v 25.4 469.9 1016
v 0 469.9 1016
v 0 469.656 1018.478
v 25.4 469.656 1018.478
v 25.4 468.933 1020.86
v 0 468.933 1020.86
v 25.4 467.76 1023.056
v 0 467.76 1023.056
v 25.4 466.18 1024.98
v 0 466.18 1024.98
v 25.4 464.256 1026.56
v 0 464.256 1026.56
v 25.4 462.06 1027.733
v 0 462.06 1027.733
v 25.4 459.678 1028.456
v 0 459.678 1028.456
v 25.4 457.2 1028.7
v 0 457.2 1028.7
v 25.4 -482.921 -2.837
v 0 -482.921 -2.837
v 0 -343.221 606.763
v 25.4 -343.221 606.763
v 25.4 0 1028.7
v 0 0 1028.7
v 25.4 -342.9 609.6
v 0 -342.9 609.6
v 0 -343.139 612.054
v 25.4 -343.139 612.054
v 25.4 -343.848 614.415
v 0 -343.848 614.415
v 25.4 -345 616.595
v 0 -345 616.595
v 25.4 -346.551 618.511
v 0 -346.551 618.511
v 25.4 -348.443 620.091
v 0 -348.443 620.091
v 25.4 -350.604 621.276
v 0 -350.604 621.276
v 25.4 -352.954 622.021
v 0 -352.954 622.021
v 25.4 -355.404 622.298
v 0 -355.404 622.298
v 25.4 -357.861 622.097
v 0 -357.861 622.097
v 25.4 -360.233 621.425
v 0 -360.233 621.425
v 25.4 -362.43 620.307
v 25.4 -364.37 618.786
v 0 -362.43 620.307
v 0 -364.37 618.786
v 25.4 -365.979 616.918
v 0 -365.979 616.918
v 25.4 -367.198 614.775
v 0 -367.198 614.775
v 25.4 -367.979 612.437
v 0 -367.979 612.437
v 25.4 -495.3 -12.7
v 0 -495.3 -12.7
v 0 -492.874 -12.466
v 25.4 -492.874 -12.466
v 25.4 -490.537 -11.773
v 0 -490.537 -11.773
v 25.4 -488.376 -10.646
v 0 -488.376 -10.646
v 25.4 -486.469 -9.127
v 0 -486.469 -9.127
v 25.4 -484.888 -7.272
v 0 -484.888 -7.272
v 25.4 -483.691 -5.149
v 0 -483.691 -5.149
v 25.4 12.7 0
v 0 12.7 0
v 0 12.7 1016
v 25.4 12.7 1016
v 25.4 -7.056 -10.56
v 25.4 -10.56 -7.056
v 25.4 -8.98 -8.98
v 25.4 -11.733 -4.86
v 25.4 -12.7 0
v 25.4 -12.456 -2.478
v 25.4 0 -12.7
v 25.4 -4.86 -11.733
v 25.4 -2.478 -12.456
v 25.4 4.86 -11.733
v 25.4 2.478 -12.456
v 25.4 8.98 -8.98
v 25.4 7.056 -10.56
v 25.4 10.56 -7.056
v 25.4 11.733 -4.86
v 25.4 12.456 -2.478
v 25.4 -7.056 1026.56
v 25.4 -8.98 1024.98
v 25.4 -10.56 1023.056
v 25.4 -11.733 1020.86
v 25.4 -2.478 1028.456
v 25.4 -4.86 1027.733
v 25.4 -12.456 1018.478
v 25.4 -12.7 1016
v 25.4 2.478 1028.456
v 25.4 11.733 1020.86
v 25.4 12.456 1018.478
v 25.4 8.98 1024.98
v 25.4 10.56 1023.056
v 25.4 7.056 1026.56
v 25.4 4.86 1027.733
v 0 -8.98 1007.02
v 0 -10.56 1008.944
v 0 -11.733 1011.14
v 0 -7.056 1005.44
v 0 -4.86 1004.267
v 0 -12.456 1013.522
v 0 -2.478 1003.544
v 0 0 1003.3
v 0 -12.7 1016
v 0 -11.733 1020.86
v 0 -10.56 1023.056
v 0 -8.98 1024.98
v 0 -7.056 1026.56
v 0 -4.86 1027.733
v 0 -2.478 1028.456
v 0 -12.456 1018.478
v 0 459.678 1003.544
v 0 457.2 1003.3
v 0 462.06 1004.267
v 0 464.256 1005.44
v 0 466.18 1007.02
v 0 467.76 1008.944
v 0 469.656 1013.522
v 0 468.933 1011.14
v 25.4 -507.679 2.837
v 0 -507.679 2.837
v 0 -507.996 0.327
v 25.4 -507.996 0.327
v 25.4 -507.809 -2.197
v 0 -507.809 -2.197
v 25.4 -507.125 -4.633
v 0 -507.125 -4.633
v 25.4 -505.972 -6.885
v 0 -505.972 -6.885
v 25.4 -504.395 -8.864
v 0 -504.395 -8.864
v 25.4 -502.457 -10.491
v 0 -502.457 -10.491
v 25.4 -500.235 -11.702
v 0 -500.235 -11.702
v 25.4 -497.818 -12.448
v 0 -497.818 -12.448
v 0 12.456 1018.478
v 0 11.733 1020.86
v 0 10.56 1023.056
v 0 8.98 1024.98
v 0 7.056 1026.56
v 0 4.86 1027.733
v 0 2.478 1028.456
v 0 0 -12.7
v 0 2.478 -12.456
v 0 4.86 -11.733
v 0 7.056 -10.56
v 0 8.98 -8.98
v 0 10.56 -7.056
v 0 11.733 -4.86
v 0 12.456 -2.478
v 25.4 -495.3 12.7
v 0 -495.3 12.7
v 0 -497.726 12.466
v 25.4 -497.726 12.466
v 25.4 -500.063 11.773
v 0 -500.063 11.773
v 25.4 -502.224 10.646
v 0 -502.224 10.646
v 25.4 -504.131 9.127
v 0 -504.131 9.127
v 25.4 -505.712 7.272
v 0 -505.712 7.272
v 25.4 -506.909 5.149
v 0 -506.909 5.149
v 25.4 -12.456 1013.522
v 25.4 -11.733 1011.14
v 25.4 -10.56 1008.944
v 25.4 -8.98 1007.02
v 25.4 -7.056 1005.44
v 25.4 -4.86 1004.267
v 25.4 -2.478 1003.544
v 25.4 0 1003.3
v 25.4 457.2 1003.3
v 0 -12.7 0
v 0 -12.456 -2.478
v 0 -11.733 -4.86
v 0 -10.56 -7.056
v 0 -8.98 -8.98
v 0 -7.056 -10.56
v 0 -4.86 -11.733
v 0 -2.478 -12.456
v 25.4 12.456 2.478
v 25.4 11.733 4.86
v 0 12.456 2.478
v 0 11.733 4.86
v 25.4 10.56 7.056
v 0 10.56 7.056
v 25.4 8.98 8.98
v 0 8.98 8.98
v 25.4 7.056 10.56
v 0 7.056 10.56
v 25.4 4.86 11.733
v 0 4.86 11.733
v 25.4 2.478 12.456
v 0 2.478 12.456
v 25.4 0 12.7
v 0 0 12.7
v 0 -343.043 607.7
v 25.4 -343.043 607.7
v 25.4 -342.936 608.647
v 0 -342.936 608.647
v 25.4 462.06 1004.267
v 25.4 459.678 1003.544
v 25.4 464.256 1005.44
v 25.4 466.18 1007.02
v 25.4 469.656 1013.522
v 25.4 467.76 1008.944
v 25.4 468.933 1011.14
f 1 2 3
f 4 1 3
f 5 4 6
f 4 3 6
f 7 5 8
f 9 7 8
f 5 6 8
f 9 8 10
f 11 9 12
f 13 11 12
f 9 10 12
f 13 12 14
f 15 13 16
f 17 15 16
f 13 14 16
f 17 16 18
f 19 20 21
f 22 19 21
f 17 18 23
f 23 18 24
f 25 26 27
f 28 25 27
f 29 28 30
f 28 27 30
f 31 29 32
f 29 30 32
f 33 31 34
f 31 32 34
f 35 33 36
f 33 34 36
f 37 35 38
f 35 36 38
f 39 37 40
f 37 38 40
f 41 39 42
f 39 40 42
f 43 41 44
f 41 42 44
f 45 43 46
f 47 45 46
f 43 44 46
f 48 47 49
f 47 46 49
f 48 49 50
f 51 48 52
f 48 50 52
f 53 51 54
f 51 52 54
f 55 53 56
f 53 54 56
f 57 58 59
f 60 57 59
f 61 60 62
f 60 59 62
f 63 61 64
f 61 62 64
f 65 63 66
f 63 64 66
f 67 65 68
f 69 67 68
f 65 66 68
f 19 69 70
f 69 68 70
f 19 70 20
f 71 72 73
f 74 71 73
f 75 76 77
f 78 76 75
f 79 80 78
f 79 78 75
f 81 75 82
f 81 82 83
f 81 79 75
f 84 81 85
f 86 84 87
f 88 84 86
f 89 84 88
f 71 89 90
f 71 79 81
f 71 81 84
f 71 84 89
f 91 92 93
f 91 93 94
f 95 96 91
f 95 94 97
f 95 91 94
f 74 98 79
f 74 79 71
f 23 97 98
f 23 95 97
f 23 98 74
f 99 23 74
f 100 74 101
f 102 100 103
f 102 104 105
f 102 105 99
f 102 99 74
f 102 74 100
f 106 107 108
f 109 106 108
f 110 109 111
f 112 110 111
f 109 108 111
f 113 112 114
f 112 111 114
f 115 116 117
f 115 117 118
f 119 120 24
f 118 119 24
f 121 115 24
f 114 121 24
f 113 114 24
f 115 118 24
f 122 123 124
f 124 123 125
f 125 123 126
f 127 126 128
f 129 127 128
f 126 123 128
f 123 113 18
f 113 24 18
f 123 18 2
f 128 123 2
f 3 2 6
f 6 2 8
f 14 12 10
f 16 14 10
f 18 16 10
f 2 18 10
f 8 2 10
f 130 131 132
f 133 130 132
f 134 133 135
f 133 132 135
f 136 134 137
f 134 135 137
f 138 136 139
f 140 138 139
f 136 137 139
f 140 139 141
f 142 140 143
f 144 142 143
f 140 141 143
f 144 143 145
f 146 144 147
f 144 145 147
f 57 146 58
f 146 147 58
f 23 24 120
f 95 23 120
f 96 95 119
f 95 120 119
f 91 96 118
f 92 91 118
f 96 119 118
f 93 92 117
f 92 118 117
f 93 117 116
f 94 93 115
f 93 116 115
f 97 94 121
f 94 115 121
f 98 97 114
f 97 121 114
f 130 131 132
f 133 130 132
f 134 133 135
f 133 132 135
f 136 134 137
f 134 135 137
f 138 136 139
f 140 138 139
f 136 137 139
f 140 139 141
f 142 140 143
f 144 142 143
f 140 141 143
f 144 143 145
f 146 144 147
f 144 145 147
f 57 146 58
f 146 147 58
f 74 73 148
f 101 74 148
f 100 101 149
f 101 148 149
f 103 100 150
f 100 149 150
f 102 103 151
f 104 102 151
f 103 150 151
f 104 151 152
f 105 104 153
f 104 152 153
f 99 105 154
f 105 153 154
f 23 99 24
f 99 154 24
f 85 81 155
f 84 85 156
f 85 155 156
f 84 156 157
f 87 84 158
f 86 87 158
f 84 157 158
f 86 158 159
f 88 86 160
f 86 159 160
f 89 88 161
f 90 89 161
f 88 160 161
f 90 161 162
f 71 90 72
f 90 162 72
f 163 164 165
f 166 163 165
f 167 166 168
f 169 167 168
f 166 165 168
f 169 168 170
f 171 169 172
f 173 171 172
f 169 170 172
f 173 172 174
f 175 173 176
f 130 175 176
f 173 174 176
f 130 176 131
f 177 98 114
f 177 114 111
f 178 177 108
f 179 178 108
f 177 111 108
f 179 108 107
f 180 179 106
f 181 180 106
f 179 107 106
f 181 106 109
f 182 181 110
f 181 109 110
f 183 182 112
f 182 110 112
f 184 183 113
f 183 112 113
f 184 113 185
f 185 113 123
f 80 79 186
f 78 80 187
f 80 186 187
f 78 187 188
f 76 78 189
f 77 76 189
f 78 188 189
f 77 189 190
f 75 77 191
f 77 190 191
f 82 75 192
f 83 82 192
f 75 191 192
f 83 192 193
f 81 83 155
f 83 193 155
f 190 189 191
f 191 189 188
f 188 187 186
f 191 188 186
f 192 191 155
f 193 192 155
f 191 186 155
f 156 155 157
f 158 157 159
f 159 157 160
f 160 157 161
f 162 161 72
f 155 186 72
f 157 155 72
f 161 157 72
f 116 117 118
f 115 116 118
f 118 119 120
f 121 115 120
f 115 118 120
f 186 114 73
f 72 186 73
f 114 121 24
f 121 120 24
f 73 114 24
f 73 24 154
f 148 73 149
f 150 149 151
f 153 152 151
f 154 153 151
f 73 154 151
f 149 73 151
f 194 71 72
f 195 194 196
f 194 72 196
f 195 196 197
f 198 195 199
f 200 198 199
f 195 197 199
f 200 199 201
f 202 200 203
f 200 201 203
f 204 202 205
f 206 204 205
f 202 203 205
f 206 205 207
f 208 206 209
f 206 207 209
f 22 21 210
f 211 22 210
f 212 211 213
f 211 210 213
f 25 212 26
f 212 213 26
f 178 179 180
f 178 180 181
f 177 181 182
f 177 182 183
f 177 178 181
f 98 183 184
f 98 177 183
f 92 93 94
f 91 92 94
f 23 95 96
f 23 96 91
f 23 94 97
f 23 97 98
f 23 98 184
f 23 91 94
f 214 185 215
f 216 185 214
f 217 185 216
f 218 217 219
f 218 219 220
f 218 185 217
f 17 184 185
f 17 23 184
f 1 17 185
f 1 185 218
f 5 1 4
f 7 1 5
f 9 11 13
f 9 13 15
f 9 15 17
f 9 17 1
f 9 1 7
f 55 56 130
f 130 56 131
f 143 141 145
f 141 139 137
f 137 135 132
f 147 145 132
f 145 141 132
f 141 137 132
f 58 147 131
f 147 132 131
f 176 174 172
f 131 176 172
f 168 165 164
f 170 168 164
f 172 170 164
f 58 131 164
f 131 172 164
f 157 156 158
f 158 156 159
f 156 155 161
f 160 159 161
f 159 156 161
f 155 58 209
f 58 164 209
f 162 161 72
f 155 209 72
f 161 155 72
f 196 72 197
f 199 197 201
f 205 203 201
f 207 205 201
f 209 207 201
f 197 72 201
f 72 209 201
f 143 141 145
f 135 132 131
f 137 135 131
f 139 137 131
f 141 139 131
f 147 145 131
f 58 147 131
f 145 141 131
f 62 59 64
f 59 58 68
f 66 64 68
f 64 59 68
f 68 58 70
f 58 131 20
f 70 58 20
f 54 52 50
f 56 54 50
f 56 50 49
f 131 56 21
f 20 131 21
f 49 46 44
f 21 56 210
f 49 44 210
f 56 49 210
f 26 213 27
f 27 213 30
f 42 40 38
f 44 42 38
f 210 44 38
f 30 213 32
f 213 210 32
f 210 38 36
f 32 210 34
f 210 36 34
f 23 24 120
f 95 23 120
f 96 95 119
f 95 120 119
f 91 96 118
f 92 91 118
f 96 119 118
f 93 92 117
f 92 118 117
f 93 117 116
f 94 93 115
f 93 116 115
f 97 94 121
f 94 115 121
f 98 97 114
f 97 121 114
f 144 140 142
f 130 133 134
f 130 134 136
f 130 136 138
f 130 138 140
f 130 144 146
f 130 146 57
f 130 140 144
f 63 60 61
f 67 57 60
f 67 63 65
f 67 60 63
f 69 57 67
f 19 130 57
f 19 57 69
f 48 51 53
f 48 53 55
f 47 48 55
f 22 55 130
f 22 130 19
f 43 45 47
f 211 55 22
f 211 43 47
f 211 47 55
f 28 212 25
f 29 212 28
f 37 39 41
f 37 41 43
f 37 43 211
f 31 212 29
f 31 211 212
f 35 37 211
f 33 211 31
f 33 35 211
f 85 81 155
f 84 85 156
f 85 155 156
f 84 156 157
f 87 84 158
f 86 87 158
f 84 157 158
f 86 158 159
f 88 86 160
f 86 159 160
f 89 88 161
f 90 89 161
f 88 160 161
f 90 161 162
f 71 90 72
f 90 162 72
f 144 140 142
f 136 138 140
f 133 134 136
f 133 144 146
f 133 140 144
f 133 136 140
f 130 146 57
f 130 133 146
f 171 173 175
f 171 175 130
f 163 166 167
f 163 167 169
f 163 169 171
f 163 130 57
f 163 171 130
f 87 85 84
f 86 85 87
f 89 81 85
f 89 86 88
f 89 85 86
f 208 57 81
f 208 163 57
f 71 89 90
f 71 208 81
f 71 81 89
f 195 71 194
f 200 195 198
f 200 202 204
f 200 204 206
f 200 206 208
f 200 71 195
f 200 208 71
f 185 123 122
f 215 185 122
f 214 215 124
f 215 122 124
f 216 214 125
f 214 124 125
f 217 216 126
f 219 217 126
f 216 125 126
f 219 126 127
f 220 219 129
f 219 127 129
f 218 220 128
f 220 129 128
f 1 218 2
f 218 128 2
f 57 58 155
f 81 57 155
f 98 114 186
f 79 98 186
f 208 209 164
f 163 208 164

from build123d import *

# Parameters (mm, degrees)
F1_DEPTH = 25.4
F2_DEPTH = 25.4
F3_DEPTH = 25.4
F4_DEPTH = 25.4


with BuildPart() as f1:
    # F0 (on Right) → F1 (new body)
    with BuildSketch(Plane.YZ):
        with BuildLine():
            ThreePointArc((12.7, 1016), (8.9802561211, 1024.9802561211), (0, 1028.7))
            ThreePointArc((0, 1028.7), (-8.9802561211, 1024.9802561211), (-12.7, 1016))
            ThreePointArc((-12.7, 1016), (-8.9802561211, 1007.0197438789), (0, 1003.3))
            ThreePointArc((0, 1003.3), (8.9802561211, 1007.0197438789), (12.7, 1016))
        make_face()
        with BuildLine():
            Line((0, 1003.3), (12.7, 1003.3))
            Line((12.7, 1003.3), (12.7, 1016))
            ThreePointArc((12.7, 1016), (8.9802561211, 1007.0197438789), (0, 1003.3))
        make_face()
        with BuildLine():
            ThreePointArc((0, -12.7), (8.9802561211, -8.9802561211), (12.7, 0))
            ThreePointArc((12.7, 0), (8.9802561211, 8.9802561211), (0, 12.7))
            ThreePointArc((0, 12.7), (-8.9802561211, 8.9802561211), (-12.7, 0))
            ThreePointArc((-12.7, 0), (-8.9802561211, -8.9802561211), (0, -12.7))
        make_face()
        with BuildLine():
            Line((0, 12.7), (-12.7, 12.7))
            Line((-12.7, 12.7), (-12.7, 0))
            ThreePointArc((-12.7, 0), (-8.9802561211, 8.9802561211), (0, 12.7))
        make_face()
        with BuildLine():
            Line((12.7, 0), (12.7, 1003.3))
            Line((12.7, 1003.3), (0, 1003.3))
            ThreePointArc((0, 1003.3), (-8.9802561211, 1007.0197438789), (-12.7, 1016))
            Line((-12.7, 1016), (-12.7, 12.7))
            Line((-12.7, 12.7), (0, 12.7))
            ThreePointArc((0, 12.7), (8.9802561211, 8.9802561211), (12.7, 0))
        make_face()
    extrude(amount=F1_DEPTH)


with BuildPart() as f2:
    # F0 (on Right) → F2 (new body)
    with BuildSketch(Plane.YZ):
        with BuildLine():
            ThreePointArc((457.2, 1003.3), (444.5, 1016), (457.2, 1028.7))
            Line((457.2, 1028.7), (0, 1028.7))
            ThreePointArc((0, 1028.7), (8.9802561211, 1024.9802561211), (12.7, 1016))
            Line((12.7, 1016), (12.7, 1003.3))
            Line((12.7, 1003.3), (457.2, 1003.3))
        make_face()
        with BuildLine():
            ThreePointArc((457.2, 1003.3), (466.1802561211, 1007.0197438789), (469.9, 1016))
            ThreePointArc((469.9, 1016), (466.1802561211, 1024.9802561211), (457.2, 1028.7))
            ThreePointArc((457.2, 1028.7), (444.5, 1016), (457.2, 1003.3))
        make_face()
        with BuildLine():
            ThreePointArc((12.7, 1016), (8.9802561211, 1024.9802561211), (0, 1028.7))
            ThreePointArc((0, 1028.7), (-8.9802561211, 1024.9802561211), (-12.7, 1016))
            ThreePointArc((-12.7, 1016), (-8.9802561211, 1007.0197438789), (0, 1003.3))
            ThreePointArc((0, 1003.3), (8.9802561211, 1007.0197438789), (12.7, 1016))
        make_face()
        with BuildLine():
            Line((0, 1003.3), (12.7, 1003.3))
            Line((12.7, 1003.3), (12.7, 1016))
            ThreePointArc((12.7, 1016), (8.9802561211, 1007.0197438789), (0, 1003.3))
        make_face()
    extrude(amount=F2_DEPTH)


with BuildPart() as f3:
    # F0 (on Right) → F3 (new body)
    with BuildSketch(Plane.YZ):
        with BuildLine():
            ThreePointArc((-507.6791004453, 2.8368771854), (-505.2327322589, -7.9139642325), (-495.3, -12.7))
            ThreePointArc((-495.3, -12.7), (-487.3860357675, -9.9327322589), (-482.9208995547, -2.8368771854))
            ThreePointArc((-482.9208995547, -2.8368771854), (-482.6804798892, -1.4274845611), (-482.6, 0))
            ThreePointArc((-482.6, 0), (-486.3197438789, 8.9802561211), (-495.3, 12.7))
            ThreePointArc((-495.3, 12.7), (-503.2139642325, 9.9327322589), (-507.6791004453, 2.8368771854))
        make_face()
        with BuildLine():
            Line((-12.7, 0), (-12.7, 12.7))
            Line((-12.7, 12.7), (-479.3603651997, 12.7))
            Line((-479.3603651997, 12.7), (-482.9208995547, -2.8368771854))
            ThreePointArc((-482.9208995547, -2.8368771854), (-487.3860357675, -9.9327322589), (-495.3, -12.7))
            Line((-495.3, -12.7), (0, -12.7))
            ThreePointArc((0, -12.7), (-8.9802561211, -8.9802561211), (-12.7, 0))
        make_face()
        with BuildLine():
            Line((-482.9208995547, -2.8368771854), (-479.3603651997, 12.7))
            Line((-479.3603651997, 12.7), (-495.3, 12.7))
            ThreePointArc((-495.3, 12.7), (-486.3197438789, 8.9802561211), (-482.6, 0))
            ThreePointArc((-482.6, 0), (-482.6804798892, -1.4274845611), (-482.9208995547, -2.8368771854))
        make_face()
        with BuildLine():
            Line((0, 12.7), (-12.7, 12.7))
            Line((-12.7, 12.7), (-12.7, 0))
            ThreePointArc((-12.7, 0), (-8.9802561211, 8.9802561211), (0, 12.7))
        make_face()
        with BuildLine():
            ThreePointArc((0, -12.7), (8.9802561211, -8.9802561211), (12.7, 0))
            ThreePointArc((12.7, 0), (8.9802561211, 8.9802561211), (0, 12.7))
            ThreePointArc((0, 12.7), (-8.9802561211, 8.9802561211), (-12.7, 0))
            ThreePointArc((-12.7, 0), (-8.9802561211, -8.9802561211), (0, -12.7))
        make_face()
    extrude(amount=F3_DEPTH)


with BuildPart() as f4:
    # F0 (on Right) → F4 (new body)
    with BuildSketch(Plane.YZ):
        with BuildLine():
            ThreePointArc((-507.6791004453, 2.8368771854), (-505.2327322589, -7.9139642325), (-495.3, -12.7))
            ThreePointArc((-495.3, -12.7), (-487.3860357675, -9.9327322589), (-482.9208995547, -2.8368771854))
            ThreePointArc((-482.9208995547, -2.8368771854), (-482.6804798892, -1.4274845611), (-482.6, 0))
            ThreePointArc((-482.6, 0), (-486.3197438789, 8.9802561211), (-495.3, 12.7))
            ThreePointArc((-495.3, 12.7), (-503.2139642325, 9.9327322589), (-507.6791004453, 2.8368771854))
        make_face()
        with BuildLine():
            Line((-482.9208995547, -2.8368771854), (-479.3603651997, 12.7))
            Line((-479.3603651997, 12.7), (-495.3, 12.7))
            ThreePointArc((-495.3, 12.7), (-486.3197438789, 8.9802561211), (-482.6, 0))
            ThreePointArc((-482.6, 0), (-482.6804798892, -1.4274845611), (-482.9208995547, -2.8368771854))
        make_face()
        with BuildLine():
            Line((-495.3, 12.7), (-479.3603651997, 12.7))
            Line((-479.3603651997, 12.7), (-343.2208995547, 606.7631228146))
            ThreePointArc((-343.2208995547, 606.7631228146), (-358.4368771854, 597.2208995547), (-367.9791004453, 612.4368771854))
            Line((-367.9791004453, 612.4368771854), (-507.6791004453, 2.8368771854))
            ThreePointArc((-507.6791004453, 2.8368771854), (-503.2139642325, 9.9327322589), (-495.3, 12.7))
        make_face()
        with BuildLine():
            ThreePointArc((-367.9791004453, 612.4368771854), (-358.4368771854, 597.2208995547), (-343.2208995547, 606.7631228146))
            ThreePointArc((-343.2208995547, 606.7631228146), (-342.9804798892, 608.1725154389), (-342.9, 609.6))
            ThreePointArc((-342.9, 609.6), (-354.1725154389, 622.2195201108), (-367.9791004453, 612.4368771854))
        make_face()
    extrude(amount=F4_DEPTH)


solid = Compound([f1.part, f2.part, f3.part, f4.part])
